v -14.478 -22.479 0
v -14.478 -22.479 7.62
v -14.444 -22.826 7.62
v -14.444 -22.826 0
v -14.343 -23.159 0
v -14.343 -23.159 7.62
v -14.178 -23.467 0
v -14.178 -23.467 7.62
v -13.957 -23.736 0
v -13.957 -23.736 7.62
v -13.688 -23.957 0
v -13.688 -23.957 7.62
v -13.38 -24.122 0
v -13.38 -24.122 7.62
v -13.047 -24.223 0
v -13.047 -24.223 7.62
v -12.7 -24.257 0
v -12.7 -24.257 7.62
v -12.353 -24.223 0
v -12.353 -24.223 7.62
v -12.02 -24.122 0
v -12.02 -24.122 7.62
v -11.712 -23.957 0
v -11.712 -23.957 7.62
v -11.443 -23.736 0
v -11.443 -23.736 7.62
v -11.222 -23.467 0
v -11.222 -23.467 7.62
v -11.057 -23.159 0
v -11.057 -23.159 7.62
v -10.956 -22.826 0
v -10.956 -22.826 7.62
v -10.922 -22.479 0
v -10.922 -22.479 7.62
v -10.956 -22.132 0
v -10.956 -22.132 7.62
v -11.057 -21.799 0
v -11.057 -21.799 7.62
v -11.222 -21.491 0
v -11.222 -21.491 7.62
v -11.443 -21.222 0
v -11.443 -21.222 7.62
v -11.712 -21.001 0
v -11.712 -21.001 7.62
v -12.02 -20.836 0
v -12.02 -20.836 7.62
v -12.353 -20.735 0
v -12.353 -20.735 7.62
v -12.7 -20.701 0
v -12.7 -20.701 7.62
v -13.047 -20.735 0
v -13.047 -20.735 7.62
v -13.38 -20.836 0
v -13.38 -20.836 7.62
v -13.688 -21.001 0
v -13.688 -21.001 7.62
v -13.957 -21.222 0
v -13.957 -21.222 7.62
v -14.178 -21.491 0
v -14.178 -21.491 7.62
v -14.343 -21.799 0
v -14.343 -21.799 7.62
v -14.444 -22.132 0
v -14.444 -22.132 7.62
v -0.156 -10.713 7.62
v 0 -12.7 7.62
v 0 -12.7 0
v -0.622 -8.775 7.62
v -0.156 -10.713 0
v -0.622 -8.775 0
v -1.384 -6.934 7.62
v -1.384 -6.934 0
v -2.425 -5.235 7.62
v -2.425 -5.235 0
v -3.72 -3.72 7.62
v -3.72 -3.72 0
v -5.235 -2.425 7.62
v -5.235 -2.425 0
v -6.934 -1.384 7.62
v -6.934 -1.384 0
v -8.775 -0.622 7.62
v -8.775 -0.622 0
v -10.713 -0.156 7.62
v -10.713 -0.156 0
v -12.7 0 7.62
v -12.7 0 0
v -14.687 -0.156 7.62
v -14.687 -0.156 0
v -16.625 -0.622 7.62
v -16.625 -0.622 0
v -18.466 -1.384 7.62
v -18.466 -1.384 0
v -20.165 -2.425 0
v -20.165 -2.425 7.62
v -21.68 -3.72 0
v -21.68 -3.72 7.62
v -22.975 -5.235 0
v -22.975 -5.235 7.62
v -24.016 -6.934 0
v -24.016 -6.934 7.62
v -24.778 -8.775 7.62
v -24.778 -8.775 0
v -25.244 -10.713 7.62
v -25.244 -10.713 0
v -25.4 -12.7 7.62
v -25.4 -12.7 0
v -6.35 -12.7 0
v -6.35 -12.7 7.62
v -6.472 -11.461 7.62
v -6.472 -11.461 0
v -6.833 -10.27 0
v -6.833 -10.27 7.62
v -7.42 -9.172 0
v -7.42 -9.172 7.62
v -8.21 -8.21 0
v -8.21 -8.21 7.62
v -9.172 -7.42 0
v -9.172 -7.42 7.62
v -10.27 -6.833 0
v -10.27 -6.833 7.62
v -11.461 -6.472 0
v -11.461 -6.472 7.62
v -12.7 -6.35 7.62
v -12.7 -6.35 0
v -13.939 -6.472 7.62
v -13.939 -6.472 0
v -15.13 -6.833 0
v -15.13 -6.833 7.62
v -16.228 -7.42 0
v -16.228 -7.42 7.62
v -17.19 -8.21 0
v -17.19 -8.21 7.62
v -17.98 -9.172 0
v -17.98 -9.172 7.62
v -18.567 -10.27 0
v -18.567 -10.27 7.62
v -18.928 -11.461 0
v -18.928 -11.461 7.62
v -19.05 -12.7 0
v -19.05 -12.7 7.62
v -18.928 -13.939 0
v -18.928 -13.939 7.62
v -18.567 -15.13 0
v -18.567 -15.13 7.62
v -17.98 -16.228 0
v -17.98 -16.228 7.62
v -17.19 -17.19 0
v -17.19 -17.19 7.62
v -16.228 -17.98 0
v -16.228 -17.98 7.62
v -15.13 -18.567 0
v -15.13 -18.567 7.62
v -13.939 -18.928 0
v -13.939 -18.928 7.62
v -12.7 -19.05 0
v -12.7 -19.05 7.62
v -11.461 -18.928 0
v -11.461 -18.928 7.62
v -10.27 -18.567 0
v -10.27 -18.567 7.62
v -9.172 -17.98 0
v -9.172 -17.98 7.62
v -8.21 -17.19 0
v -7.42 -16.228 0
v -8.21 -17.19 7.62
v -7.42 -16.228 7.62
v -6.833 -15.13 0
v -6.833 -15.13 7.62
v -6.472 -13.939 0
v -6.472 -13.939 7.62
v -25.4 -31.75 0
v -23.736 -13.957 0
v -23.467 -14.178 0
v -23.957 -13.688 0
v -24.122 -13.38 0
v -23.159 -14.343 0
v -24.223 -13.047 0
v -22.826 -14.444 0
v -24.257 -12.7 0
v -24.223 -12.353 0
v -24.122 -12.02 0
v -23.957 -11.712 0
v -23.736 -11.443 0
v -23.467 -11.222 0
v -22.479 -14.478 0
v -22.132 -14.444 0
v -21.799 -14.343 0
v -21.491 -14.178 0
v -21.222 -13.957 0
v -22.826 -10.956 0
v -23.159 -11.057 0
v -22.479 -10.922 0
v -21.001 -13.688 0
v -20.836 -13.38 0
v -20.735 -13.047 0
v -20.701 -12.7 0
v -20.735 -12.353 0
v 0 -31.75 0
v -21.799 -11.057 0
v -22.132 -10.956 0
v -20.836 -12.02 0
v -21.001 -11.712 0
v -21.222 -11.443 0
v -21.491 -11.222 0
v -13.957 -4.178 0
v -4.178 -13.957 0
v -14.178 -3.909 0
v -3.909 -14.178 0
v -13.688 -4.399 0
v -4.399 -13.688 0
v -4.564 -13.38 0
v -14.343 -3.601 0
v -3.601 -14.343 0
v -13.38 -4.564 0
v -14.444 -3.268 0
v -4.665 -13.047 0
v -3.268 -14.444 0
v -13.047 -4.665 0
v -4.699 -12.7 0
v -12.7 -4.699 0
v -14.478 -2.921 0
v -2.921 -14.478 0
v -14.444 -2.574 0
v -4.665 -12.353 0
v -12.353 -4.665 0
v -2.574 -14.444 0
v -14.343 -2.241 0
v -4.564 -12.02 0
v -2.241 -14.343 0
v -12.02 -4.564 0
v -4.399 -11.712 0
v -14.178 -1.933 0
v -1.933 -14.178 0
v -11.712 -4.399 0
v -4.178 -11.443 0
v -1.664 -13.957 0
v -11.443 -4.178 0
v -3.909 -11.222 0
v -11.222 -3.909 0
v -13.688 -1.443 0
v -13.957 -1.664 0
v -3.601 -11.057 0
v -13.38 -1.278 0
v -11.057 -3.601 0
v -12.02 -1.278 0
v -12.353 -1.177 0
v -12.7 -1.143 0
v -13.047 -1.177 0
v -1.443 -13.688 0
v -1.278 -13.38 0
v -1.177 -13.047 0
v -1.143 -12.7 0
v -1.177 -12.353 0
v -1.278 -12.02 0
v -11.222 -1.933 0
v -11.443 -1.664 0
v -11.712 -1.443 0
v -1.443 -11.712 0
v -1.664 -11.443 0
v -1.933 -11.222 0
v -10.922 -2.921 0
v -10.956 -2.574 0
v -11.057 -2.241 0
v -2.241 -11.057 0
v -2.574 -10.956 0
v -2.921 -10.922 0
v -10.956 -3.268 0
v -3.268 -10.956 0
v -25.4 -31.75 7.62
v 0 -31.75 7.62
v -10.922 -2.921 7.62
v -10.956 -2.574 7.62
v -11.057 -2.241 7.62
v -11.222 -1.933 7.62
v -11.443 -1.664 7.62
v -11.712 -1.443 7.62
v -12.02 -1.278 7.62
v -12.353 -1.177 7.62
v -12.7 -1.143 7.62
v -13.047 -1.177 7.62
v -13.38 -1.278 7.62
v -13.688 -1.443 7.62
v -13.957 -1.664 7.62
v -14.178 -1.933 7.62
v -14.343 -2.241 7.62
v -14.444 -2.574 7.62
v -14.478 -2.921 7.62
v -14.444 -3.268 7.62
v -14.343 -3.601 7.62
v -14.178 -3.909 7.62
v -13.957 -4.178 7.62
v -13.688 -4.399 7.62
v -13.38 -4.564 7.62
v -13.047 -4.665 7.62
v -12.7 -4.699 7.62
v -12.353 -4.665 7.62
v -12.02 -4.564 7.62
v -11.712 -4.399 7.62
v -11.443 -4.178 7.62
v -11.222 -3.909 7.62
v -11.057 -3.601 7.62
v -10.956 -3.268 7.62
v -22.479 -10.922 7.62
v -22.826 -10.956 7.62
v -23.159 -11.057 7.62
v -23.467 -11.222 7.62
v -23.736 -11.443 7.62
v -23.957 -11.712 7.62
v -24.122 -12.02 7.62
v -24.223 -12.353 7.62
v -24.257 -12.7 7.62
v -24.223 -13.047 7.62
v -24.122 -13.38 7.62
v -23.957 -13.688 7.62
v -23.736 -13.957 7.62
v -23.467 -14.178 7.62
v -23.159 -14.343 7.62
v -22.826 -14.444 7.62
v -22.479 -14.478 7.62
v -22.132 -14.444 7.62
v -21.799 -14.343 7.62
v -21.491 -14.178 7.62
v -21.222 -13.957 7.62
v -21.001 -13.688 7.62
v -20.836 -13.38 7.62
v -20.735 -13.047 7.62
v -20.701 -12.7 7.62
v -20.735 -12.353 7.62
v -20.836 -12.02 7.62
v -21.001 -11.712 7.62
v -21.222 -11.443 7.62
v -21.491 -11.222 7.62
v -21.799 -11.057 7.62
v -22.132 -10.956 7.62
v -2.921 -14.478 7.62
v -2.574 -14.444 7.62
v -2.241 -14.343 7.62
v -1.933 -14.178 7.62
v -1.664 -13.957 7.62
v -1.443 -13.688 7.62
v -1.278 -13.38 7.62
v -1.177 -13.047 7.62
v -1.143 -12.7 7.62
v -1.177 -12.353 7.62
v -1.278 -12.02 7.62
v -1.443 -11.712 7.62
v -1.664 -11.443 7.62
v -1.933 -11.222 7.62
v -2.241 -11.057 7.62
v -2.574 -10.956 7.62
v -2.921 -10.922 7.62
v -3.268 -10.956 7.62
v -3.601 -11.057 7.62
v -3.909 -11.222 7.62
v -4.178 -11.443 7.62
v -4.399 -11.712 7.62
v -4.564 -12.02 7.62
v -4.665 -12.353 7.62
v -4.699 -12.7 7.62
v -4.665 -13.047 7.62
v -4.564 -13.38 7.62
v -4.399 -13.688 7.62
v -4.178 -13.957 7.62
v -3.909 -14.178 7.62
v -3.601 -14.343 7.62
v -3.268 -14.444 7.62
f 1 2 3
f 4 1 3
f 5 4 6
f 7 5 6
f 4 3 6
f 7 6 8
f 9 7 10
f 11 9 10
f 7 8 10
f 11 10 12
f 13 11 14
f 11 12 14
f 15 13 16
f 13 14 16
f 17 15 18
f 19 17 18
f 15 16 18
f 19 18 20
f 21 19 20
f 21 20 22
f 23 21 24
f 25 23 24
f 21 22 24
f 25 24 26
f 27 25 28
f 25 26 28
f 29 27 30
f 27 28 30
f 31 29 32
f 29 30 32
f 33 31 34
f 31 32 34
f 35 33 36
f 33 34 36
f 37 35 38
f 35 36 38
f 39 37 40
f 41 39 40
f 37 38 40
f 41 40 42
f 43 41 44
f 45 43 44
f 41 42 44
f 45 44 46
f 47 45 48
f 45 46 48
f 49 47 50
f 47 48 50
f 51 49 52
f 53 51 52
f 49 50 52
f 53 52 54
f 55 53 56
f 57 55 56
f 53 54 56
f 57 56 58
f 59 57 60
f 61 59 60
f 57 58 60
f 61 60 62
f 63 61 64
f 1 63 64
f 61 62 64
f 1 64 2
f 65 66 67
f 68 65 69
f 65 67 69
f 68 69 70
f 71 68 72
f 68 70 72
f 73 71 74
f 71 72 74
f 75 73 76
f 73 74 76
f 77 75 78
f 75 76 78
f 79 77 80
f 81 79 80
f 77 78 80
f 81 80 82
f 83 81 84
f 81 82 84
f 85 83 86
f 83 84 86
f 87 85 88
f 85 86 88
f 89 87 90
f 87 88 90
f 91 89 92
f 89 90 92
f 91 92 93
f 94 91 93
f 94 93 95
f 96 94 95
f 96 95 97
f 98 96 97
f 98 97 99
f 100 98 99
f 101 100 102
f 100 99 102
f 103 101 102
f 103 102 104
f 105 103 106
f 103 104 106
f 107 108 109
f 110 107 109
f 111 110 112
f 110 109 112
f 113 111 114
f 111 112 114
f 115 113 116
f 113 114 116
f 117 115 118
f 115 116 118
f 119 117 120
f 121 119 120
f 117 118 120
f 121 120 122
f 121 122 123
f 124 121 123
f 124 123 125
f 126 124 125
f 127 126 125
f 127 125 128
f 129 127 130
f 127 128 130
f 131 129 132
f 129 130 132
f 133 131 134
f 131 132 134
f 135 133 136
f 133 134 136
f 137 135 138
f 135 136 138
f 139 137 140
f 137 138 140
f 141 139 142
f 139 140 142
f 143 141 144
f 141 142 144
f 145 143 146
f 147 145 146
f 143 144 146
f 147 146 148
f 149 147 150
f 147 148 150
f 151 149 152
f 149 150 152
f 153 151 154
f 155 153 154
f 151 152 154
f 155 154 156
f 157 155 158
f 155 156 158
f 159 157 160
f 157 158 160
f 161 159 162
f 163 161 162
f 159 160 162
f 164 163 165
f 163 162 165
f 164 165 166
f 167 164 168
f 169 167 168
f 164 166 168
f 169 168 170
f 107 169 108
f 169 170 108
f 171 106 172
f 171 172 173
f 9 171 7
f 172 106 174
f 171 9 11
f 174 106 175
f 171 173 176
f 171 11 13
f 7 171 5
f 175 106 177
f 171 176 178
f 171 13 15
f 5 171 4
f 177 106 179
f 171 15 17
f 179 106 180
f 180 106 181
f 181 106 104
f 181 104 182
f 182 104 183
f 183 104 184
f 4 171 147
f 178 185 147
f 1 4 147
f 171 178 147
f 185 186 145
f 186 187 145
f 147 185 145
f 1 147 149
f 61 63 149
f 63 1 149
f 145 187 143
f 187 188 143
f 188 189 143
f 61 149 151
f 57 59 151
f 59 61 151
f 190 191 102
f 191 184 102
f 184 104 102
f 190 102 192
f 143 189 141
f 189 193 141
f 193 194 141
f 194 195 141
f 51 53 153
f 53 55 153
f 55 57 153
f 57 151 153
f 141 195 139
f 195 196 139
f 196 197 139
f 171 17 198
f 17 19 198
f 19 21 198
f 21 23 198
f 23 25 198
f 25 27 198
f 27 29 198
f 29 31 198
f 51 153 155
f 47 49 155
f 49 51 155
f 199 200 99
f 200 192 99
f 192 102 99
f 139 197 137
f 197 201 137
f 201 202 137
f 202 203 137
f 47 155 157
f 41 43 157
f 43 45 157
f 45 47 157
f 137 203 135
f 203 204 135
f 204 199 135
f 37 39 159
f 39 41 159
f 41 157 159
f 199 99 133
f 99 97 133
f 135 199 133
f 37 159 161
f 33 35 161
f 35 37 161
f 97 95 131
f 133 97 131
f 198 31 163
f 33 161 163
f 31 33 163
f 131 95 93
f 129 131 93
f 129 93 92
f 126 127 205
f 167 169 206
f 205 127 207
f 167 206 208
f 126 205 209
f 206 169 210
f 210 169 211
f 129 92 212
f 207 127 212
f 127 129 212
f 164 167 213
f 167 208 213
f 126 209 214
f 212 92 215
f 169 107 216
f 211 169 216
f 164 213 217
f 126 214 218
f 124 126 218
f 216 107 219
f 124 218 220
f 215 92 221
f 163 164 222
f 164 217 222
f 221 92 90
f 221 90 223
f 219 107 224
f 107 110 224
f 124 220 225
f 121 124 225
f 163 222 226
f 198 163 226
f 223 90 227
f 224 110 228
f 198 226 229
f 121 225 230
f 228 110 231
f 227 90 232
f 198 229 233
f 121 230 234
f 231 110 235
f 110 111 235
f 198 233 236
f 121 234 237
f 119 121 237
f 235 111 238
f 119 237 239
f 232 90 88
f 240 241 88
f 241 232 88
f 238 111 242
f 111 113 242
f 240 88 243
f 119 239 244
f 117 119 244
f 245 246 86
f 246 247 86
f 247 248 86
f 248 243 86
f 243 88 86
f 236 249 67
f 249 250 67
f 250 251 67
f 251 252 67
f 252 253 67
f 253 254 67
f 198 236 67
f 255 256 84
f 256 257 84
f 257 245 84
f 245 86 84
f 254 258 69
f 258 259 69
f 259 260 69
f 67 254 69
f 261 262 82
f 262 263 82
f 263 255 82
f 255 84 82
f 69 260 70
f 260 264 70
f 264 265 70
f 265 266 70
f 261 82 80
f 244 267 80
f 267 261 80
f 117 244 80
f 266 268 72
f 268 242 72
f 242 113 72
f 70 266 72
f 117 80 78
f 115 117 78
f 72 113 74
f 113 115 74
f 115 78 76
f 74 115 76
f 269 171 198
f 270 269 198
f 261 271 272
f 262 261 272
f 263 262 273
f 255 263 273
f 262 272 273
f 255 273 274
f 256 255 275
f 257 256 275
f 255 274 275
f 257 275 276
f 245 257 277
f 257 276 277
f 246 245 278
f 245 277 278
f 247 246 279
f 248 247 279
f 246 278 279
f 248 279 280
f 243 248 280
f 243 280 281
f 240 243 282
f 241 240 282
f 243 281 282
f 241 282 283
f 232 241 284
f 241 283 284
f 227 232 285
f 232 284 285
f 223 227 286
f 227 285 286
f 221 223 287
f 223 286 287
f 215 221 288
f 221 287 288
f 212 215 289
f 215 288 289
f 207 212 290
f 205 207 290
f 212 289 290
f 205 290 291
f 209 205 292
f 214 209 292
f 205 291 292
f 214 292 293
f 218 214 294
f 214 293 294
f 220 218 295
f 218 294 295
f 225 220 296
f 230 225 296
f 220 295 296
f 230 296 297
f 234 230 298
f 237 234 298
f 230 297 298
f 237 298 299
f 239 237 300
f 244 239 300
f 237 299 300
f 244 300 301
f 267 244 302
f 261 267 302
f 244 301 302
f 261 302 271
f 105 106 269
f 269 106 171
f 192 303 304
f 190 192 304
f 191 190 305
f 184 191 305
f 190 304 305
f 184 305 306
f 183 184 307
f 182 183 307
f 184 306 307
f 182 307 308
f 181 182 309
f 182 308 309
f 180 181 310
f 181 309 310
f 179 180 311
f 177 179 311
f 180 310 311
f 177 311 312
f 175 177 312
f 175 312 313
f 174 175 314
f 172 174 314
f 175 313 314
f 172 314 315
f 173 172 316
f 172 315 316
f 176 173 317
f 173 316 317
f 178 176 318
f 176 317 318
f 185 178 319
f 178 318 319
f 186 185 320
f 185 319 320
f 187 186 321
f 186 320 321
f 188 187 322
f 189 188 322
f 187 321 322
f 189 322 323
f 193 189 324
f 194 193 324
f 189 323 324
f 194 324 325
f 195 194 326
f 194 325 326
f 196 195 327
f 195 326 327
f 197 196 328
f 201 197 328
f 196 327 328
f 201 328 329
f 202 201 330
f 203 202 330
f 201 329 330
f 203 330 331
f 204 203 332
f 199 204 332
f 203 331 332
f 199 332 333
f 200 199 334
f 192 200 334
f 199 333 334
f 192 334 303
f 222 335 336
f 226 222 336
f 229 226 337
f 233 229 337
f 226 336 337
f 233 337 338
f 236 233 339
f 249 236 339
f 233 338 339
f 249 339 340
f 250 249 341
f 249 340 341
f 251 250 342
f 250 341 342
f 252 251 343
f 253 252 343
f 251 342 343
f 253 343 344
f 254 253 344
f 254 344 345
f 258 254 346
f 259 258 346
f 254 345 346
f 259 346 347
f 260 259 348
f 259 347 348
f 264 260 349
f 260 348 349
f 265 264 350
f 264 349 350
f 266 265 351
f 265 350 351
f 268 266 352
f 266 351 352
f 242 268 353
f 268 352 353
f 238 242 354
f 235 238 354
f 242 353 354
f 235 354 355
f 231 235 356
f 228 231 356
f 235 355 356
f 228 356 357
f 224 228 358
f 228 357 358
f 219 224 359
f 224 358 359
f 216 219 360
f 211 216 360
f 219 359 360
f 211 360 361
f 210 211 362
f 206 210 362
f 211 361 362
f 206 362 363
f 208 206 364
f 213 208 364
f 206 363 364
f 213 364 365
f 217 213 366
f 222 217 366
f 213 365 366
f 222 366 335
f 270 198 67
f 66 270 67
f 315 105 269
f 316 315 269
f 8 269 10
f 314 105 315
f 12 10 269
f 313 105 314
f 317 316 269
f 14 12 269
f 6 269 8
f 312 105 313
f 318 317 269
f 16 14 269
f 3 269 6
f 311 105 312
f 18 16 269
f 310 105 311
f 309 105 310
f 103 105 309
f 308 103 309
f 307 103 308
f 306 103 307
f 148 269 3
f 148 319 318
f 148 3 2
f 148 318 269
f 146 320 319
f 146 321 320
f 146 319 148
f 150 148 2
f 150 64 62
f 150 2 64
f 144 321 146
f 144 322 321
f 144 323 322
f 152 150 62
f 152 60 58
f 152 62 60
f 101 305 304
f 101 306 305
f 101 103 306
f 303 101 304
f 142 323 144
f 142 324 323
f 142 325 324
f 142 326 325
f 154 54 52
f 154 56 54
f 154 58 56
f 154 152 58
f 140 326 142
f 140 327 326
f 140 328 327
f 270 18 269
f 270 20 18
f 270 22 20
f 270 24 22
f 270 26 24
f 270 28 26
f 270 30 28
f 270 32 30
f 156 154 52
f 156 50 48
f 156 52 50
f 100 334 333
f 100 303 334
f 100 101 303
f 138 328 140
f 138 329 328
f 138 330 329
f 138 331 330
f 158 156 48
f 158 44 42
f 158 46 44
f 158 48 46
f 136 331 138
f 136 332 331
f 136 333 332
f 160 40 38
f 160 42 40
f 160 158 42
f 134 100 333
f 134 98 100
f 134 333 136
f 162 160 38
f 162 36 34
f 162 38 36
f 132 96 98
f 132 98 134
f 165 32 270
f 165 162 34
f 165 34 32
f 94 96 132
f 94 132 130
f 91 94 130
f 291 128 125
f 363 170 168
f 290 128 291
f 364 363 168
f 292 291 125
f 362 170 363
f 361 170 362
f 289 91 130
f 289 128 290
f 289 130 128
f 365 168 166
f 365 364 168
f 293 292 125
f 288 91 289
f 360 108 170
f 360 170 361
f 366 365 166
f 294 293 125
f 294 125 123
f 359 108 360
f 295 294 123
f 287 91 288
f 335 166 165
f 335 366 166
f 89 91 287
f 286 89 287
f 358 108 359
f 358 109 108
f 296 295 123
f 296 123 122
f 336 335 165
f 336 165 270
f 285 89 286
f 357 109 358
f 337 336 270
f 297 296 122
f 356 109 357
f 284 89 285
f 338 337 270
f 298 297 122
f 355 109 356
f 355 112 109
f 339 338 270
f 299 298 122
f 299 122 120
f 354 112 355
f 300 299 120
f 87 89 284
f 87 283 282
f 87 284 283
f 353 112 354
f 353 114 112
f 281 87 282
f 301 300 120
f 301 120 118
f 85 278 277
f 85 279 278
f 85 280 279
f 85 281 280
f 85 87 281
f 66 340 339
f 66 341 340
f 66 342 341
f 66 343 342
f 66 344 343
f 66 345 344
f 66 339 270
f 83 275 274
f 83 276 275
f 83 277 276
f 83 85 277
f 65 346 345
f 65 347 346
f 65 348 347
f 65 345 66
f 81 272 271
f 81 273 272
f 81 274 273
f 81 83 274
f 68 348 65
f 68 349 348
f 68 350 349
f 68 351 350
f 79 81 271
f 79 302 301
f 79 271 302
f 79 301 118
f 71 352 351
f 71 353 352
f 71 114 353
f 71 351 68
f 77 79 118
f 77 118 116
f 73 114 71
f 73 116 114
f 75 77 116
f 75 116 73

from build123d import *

# Parameters (mm, degrees)
SKETCH1_R           = 12.7
BOSS_EXTRUDE1_DEPTH = 7.62
SKETCH2_R           = 6.35
CUT_EXTRUDE1_DEPTH  = 7.62
SKETCH3_R           = 1.778
CUT_EXTRUDE2_DEPTH  = 7.62
CIRPATTERN1_COUNT   = 4


with BuildPart() as part:
    # Sketch1 → Boss-Extrude1 (new body)
    with BuildSketch(Plane.XY):
        with BuildLine():
            Line((0, -31.75), (0, -12.7))
            ThreePointArc((0, -12.7), (-12.699999961, -25.4), (-25.4, -12.700000079))
            Line((-25.4, -12.700000079), (-25.4, -31.75))
            Line((-25.4, -31.75), (0, -31.75))
        make_face()
        with Locations((-12.7, -12.7)):
            Circle(SKETCH1_R)
    extrude(amount=BOSS_EXTRUDE1_DEPTH)

    # Sketch2 → Cut-Extrude1 (cut)
    with BuildSketch(Plane.XY.offset(7.62)):
        with Locations((-12.7, -12.7)):
            Circle(SKETCH2_R)
    extrude(amount=-CUT_EXTRUDE1_DEPTH, mode=Mode.SUBTRACT)

    # Sketch3 → Cut-Extrude2 (cut)
    with BuildSketch(Plane.XY.offset(7.62)):
        with Locations((-12.7, -2.921)):
            Circle(SKETCH3_R)
    cut_extrude2 = extrude(amount=-CUT_EXTRUDE2_DEPTH, mode=Mode.SUBTRACT)

    # CirPattern1: Cut-Extrude2 ×4 about axis
    cirpattern1_axis = Axis((-12.7, -12.7, 0), (0, 0, 1))
    for i in range(1, CIRPATTERN1_COUNT):
        add(cut_extrude2.rotate(cirpattern1_axis, i * 360 / CIRPATTERN1_COUNT), mode=Mode.SUBTRACT)


solid = part.part
